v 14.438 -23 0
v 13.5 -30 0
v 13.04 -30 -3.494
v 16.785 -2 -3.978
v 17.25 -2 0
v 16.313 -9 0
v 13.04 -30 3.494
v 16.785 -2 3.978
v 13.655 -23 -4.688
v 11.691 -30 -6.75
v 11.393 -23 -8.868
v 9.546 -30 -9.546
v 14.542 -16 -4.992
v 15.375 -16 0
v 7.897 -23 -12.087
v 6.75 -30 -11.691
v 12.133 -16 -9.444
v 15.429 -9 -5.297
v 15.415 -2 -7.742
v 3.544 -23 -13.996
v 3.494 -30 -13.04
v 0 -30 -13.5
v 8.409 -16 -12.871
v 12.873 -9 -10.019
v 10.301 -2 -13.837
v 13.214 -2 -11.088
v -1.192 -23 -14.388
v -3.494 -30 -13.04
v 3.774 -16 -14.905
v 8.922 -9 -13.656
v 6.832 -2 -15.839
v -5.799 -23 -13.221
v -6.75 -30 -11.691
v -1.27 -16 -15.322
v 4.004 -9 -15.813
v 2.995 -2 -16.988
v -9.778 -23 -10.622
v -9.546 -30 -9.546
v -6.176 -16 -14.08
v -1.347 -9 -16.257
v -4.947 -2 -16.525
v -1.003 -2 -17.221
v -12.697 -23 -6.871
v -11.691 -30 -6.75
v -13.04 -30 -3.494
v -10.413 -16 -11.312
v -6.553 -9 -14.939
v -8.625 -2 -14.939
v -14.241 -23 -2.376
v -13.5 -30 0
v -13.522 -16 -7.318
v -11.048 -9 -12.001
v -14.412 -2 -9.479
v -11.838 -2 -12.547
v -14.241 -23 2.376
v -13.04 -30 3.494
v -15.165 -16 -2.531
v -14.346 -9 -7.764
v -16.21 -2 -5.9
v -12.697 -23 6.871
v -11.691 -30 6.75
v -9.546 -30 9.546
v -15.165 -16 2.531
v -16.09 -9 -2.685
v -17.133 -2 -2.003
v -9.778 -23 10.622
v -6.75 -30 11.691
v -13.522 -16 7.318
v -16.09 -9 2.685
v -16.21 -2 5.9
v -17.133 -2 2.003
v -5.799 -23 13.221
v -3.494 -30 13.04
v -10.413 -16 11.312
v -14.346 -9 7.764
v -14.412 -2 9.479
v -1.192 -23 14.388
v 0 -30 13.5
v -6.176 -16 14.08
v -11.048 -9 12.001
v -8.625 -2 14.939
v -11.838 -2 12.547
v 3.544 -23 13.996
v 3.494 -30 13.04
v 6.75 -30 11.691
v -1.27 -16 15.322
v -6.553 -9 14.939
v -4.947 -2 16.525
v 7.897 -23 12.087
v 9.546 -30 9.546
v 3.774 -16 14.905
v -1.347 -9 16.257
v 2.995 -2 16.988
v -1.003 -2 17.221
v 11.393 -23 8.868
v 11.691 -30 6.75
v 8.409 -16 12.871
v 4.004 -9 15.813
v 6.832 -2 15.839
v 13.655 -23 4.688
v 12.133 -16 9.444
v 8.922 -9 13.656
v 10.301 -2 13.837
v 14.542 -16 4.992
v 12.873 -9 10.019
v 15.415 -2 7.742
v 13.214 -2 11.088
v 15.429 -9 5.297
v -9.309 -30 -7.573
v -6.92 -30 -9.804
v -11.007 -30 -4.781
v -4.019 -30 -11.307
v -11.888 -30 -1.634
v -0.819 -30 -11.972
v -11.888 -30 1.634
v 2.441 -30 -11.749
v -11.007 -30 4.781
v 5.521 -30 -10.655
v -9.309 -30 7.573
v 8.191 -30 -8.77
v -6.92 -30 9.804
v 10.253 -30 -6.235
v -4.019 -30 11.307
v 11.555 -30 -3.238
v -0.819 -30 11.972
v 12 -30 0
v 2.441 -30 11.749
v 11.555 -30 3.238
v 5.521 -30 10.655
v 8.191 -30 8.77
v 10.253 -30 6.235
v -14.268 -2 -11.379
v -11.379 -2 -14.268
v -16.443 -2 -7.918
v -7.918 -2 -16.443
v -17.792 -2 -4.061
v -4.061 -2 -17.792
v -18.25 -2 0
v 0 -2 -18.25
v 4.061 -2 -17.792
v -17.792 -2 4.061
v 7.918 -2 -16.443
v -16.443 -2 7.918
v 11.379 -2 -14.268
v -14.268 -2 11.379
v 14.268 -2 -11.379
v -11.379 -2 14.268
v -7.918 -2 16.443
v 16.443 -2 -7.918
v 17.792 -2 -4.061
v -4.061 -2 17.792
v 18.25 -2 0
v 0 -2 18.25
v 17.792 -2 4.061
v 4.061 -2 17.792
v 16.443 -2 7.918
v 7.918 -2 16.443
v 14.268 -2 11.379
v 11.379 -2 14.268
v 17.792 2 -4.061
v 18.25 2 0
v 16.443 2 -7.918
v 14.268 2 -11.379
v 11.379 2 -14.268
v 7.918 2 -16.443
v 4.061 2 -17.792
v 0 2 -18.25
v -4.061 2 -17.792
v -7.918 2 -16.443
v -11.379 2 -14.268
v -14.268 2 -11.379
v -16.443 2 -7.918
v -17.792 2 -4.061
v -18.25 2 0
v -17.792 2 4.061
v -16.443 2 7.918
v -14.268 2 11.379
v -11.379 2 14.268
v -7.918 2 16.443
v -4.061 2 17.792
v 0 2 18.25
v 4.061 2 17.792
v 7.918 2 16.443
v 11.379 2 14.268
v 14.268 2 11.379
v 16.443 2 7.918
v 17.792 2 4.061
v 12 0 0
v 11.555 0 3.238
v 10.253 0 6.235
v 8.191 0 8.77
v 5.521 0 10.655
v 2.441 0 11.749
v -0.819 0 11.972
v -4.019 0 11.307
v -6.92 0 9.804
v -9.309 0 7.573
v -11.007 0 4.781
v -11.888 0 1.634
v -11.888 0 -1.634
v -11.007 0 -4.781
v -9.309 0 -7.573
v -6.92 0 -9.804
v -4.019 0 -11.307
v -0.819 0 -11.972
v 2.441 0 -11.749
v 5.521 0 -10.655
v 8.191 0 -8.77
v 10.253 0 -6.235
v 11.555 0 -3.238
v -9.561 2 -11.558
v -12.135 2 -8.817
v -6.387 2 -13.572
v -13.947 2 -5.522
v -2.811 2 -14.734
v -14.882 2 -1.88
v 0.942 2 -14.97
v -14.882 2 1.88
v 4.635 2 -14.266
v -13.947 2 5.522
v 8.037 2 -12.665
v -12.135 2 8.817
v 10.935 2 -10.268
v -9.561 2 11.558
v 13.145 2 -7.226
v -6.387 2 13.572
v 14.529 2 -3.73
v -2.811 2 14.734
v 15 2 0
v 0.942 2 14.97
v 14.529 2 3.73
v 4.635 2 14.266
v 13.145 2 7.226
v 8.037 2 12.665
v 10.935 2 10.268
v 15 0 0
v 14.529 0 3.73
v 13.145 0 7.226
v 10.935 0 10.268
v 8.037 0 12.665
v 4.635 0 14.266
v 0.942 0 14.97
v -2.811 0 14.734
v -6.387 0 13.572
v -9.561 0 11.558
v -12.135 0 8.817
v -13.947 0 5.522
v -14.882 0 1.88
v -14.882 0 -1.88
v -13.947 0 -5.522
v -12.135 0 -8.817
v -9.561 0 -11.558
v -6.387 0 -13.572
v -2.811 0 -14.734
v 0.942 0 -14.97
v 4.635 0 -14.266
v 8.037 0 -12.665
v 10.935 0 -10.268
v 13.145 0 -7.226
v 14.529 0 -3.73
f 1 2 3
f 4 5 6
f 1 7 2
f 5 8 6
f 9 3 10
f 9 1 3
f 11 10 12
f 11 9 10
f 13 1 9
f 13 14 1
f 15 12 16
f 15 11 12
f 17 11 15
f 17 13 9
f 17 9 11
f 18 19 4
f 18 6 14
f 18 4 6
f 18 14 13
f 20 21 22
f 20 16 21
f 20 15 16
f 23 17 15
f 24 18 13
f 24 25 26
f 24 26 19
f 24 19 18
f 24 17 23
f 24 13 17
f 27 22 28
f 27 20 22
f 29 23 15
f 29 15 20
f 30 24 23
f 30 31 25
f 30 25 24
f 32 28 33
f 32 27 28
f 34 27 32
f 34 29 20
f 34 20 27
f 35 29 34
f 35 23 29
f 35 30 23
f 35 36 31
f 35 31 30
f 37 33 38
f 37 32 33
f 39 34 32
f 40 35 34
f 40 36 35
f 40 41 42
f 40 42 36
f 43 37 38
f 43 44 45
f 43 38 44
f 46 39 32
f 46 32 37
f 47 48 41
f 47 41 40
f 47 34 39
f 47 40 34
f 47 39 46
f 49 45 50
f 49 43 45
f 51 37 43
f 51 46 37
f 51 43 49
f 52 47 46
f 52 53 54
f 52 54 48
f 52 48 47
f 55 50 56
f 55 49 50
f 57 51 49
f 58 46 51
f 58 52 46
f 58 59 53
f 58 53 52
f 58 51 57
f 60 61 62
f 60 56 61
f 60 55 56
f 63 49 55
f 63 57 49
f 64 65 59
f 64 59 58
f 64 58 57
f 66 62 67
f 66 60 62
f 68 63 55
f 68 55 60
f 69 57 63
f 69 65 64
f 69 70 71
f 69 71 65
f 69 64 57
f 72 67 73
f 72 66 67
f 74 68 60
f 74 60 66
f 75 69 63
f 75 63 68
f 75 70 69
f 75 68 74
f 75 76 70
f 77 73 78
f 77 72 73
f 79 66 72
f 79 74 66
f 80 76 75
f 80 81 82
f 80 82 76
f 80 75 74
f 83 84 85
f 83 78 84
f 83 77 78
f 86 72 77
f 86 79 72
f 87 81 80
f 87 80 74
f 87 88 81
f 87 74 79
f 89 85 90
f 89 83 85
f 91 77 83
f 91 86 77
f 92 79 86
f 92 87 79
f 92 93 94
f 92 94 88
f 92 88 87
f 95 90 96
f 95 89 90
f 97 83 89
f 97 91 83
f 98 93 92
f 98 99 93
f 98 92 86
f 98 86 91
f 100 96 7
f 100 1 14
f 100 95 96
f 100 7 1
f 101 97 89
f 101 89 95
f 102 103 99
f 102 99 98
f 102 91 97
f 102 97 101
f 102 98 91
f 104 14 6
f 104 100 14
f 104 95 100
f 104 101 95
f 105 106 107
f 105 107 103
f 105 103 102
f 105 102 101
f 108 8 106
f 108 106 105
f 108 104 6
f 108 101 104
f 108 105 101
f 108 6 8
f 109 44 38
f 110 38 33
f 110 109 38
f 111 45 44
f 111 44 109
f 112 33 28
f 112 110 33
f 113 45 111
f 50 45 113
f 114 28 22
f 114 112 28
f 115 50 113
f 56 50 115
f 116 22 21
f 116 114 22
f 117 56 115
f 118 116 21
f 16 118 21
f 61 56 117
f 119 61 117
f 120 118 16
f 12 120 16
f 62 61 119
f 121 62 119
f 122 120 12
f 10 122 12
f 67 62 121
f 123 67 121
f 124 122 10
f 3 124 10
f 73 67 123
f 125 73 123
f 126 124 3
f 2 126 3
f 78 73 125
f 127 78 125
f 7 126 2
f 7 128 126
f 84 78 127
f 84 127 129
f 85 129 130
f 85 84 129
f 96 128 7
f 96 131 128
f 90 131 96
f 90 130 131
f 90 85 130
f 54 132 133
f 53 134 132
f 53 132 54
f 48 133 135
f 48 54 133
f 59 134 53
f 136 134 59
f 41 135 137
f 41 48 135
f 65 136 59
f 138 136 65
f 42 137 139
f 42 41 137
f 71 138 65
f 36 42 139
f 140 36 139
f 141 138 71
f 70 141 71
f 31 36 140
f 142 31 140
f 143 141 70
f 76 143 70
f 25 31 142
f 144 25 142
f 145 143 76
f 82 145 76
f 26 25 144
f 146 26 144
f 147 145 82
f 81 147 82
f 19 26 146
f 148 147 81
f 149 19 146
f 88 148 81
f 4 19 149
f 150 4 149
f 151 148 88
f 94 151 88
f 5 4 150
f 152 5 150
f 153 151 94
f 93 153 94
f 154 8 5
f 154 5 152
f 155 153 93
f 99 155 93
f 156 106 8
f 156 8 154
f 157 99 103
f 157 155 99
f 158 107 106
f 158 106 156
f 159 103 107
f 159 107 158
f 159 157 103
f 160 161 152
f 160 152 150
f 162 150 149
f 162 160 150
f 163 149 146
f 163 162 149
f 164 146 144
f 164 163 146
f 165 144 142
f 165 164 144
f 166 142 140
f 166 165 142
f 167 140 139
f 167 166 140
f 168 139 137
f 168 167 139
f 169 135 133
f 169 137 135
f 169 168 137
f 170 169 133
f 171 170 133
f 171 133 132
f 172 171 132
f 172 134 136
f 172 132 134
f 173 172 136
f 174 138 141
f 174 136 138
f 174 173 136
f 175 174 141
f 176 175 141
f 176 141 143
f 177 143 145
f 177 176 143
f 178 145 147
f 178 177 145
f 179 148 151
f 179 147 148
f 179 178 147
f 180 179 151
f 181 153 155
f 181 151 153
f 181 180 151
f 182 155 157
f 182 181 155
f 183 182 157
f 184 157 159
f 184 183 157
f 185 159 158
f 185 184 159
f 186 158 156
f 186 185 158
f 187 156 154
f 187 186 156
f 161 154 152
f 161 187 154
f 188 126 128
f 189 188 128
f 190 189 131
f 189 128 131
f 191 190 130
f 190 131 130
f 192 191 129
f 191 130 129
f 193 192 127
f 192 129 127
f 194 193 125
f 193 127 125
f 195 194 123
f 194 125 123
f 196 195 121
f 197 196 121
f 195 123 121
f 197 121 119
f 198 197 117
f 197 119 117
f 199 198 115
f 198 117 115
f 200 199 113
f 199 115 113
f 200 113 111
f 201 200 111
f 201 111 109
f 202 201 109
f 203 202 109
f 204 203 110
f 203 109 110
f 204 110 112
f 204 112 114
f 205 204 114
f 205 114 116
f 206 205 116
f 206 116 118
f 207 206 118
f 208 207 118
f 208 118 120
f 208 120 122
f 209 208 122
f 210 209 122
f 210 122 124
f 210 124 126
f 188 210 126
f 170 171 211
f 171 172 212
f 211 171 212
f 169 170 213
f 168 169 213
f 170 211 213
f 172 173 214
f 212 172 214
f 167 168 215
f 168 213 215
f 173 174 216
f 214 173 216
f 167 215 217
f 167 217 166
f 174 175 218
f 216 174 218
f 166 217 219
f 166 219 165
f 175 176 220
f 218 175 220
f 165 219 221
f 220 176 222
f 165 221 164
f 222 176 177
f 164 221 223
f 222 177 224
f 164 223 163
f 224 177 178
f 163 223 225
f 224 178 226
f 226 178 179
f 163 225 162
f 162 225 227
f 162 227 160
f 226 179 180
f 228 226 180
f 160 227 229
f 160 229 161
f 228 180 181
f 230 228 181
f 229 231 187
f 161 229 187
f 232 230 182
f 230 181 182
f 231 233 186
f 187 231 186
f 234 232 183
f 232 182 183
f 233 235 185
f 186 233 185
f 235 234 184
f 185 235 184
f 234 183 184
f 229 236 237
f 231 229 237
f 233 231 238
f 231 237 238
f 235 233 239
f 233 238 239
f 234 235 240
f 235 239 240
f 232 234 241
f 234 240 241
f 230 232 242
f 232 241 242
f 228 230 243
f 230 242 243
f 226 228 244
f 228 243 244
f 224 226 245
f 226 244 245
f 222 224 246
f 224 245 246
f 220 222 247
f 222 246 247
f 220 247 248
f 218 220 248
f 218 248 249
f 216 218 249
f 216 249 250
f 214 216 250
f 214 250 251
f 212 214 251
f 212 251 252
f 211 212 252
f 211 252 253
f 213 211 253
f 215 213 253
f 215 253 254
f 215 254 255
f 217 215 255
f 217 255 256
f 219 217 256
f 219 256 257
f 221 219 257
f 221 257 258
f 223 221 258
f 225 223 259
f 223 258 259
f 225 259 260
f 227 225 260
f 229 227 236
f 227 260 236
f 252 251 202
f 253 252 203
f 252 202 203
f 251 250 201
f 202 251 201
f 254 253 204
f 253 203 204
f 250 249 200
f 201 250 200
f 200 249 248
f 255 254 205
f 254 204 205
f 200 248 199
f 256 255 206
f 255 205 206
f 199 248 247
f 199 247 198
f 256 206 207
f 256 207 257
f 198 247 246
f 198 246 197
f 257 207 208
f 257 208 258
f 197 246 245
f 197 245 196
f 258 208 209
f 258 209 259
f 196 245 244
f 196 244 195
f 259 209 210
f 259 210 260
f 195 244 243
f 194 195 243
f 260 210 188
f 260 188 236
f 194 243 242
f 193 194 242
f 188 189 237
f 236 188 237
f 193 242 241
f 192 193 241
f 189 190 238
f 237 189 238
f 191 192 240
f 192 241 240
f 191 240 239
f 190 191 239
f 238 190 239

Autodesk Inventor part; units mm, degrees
ref_plane "YZ Plane" through (0, 0, 0) normal (1, 0, 0) x (0, 1, 0)
ref_plane "XZ Plane" through (0, 0, 0) normal (0, 1, 0) x (-1, 0, 0)
ref_plane "XY Plane" through (0, 0, 0) normal (0, 0, 1) x (1, 0, 0)
sketch "Sketch1" plane through (0, 0, 0) normal (0, 0, 1) x (1, 0, 0)
  line L0 (0, 0) -> (0, -43.1) construction
  line L1 (12, 0) -> (12, -30)
  line L2 (12, -30) -> (13.5, -30)
  line L3 (13.5, -30) -> (17.25, -2)
  line L4 (18.25, 2) -> (15, 2)
  line L5 (15, 2) -> (15, 0)
  line L6 (15, 0) -> (12, 0)
  line L7 (17.25, -2) -> (18.25, -2)
  line L8 (18.25, -2) -> (18.25, 2)
  dimension "d1" = 36.5
  dimension "d2" = 24
  dimension "d3" = 30
  dimension "d4" = 2
  dimension "d5" = 1
  dimension "d6" = 30
  dimension "d7" = 27
  dimension "d8" = 2
revolve "Revolution1" add sketch "Sketch1" angle 360 about axis through (0, 0, 0) along (0, -1, 0)
properties part number "002" material "Iron, Cast"
